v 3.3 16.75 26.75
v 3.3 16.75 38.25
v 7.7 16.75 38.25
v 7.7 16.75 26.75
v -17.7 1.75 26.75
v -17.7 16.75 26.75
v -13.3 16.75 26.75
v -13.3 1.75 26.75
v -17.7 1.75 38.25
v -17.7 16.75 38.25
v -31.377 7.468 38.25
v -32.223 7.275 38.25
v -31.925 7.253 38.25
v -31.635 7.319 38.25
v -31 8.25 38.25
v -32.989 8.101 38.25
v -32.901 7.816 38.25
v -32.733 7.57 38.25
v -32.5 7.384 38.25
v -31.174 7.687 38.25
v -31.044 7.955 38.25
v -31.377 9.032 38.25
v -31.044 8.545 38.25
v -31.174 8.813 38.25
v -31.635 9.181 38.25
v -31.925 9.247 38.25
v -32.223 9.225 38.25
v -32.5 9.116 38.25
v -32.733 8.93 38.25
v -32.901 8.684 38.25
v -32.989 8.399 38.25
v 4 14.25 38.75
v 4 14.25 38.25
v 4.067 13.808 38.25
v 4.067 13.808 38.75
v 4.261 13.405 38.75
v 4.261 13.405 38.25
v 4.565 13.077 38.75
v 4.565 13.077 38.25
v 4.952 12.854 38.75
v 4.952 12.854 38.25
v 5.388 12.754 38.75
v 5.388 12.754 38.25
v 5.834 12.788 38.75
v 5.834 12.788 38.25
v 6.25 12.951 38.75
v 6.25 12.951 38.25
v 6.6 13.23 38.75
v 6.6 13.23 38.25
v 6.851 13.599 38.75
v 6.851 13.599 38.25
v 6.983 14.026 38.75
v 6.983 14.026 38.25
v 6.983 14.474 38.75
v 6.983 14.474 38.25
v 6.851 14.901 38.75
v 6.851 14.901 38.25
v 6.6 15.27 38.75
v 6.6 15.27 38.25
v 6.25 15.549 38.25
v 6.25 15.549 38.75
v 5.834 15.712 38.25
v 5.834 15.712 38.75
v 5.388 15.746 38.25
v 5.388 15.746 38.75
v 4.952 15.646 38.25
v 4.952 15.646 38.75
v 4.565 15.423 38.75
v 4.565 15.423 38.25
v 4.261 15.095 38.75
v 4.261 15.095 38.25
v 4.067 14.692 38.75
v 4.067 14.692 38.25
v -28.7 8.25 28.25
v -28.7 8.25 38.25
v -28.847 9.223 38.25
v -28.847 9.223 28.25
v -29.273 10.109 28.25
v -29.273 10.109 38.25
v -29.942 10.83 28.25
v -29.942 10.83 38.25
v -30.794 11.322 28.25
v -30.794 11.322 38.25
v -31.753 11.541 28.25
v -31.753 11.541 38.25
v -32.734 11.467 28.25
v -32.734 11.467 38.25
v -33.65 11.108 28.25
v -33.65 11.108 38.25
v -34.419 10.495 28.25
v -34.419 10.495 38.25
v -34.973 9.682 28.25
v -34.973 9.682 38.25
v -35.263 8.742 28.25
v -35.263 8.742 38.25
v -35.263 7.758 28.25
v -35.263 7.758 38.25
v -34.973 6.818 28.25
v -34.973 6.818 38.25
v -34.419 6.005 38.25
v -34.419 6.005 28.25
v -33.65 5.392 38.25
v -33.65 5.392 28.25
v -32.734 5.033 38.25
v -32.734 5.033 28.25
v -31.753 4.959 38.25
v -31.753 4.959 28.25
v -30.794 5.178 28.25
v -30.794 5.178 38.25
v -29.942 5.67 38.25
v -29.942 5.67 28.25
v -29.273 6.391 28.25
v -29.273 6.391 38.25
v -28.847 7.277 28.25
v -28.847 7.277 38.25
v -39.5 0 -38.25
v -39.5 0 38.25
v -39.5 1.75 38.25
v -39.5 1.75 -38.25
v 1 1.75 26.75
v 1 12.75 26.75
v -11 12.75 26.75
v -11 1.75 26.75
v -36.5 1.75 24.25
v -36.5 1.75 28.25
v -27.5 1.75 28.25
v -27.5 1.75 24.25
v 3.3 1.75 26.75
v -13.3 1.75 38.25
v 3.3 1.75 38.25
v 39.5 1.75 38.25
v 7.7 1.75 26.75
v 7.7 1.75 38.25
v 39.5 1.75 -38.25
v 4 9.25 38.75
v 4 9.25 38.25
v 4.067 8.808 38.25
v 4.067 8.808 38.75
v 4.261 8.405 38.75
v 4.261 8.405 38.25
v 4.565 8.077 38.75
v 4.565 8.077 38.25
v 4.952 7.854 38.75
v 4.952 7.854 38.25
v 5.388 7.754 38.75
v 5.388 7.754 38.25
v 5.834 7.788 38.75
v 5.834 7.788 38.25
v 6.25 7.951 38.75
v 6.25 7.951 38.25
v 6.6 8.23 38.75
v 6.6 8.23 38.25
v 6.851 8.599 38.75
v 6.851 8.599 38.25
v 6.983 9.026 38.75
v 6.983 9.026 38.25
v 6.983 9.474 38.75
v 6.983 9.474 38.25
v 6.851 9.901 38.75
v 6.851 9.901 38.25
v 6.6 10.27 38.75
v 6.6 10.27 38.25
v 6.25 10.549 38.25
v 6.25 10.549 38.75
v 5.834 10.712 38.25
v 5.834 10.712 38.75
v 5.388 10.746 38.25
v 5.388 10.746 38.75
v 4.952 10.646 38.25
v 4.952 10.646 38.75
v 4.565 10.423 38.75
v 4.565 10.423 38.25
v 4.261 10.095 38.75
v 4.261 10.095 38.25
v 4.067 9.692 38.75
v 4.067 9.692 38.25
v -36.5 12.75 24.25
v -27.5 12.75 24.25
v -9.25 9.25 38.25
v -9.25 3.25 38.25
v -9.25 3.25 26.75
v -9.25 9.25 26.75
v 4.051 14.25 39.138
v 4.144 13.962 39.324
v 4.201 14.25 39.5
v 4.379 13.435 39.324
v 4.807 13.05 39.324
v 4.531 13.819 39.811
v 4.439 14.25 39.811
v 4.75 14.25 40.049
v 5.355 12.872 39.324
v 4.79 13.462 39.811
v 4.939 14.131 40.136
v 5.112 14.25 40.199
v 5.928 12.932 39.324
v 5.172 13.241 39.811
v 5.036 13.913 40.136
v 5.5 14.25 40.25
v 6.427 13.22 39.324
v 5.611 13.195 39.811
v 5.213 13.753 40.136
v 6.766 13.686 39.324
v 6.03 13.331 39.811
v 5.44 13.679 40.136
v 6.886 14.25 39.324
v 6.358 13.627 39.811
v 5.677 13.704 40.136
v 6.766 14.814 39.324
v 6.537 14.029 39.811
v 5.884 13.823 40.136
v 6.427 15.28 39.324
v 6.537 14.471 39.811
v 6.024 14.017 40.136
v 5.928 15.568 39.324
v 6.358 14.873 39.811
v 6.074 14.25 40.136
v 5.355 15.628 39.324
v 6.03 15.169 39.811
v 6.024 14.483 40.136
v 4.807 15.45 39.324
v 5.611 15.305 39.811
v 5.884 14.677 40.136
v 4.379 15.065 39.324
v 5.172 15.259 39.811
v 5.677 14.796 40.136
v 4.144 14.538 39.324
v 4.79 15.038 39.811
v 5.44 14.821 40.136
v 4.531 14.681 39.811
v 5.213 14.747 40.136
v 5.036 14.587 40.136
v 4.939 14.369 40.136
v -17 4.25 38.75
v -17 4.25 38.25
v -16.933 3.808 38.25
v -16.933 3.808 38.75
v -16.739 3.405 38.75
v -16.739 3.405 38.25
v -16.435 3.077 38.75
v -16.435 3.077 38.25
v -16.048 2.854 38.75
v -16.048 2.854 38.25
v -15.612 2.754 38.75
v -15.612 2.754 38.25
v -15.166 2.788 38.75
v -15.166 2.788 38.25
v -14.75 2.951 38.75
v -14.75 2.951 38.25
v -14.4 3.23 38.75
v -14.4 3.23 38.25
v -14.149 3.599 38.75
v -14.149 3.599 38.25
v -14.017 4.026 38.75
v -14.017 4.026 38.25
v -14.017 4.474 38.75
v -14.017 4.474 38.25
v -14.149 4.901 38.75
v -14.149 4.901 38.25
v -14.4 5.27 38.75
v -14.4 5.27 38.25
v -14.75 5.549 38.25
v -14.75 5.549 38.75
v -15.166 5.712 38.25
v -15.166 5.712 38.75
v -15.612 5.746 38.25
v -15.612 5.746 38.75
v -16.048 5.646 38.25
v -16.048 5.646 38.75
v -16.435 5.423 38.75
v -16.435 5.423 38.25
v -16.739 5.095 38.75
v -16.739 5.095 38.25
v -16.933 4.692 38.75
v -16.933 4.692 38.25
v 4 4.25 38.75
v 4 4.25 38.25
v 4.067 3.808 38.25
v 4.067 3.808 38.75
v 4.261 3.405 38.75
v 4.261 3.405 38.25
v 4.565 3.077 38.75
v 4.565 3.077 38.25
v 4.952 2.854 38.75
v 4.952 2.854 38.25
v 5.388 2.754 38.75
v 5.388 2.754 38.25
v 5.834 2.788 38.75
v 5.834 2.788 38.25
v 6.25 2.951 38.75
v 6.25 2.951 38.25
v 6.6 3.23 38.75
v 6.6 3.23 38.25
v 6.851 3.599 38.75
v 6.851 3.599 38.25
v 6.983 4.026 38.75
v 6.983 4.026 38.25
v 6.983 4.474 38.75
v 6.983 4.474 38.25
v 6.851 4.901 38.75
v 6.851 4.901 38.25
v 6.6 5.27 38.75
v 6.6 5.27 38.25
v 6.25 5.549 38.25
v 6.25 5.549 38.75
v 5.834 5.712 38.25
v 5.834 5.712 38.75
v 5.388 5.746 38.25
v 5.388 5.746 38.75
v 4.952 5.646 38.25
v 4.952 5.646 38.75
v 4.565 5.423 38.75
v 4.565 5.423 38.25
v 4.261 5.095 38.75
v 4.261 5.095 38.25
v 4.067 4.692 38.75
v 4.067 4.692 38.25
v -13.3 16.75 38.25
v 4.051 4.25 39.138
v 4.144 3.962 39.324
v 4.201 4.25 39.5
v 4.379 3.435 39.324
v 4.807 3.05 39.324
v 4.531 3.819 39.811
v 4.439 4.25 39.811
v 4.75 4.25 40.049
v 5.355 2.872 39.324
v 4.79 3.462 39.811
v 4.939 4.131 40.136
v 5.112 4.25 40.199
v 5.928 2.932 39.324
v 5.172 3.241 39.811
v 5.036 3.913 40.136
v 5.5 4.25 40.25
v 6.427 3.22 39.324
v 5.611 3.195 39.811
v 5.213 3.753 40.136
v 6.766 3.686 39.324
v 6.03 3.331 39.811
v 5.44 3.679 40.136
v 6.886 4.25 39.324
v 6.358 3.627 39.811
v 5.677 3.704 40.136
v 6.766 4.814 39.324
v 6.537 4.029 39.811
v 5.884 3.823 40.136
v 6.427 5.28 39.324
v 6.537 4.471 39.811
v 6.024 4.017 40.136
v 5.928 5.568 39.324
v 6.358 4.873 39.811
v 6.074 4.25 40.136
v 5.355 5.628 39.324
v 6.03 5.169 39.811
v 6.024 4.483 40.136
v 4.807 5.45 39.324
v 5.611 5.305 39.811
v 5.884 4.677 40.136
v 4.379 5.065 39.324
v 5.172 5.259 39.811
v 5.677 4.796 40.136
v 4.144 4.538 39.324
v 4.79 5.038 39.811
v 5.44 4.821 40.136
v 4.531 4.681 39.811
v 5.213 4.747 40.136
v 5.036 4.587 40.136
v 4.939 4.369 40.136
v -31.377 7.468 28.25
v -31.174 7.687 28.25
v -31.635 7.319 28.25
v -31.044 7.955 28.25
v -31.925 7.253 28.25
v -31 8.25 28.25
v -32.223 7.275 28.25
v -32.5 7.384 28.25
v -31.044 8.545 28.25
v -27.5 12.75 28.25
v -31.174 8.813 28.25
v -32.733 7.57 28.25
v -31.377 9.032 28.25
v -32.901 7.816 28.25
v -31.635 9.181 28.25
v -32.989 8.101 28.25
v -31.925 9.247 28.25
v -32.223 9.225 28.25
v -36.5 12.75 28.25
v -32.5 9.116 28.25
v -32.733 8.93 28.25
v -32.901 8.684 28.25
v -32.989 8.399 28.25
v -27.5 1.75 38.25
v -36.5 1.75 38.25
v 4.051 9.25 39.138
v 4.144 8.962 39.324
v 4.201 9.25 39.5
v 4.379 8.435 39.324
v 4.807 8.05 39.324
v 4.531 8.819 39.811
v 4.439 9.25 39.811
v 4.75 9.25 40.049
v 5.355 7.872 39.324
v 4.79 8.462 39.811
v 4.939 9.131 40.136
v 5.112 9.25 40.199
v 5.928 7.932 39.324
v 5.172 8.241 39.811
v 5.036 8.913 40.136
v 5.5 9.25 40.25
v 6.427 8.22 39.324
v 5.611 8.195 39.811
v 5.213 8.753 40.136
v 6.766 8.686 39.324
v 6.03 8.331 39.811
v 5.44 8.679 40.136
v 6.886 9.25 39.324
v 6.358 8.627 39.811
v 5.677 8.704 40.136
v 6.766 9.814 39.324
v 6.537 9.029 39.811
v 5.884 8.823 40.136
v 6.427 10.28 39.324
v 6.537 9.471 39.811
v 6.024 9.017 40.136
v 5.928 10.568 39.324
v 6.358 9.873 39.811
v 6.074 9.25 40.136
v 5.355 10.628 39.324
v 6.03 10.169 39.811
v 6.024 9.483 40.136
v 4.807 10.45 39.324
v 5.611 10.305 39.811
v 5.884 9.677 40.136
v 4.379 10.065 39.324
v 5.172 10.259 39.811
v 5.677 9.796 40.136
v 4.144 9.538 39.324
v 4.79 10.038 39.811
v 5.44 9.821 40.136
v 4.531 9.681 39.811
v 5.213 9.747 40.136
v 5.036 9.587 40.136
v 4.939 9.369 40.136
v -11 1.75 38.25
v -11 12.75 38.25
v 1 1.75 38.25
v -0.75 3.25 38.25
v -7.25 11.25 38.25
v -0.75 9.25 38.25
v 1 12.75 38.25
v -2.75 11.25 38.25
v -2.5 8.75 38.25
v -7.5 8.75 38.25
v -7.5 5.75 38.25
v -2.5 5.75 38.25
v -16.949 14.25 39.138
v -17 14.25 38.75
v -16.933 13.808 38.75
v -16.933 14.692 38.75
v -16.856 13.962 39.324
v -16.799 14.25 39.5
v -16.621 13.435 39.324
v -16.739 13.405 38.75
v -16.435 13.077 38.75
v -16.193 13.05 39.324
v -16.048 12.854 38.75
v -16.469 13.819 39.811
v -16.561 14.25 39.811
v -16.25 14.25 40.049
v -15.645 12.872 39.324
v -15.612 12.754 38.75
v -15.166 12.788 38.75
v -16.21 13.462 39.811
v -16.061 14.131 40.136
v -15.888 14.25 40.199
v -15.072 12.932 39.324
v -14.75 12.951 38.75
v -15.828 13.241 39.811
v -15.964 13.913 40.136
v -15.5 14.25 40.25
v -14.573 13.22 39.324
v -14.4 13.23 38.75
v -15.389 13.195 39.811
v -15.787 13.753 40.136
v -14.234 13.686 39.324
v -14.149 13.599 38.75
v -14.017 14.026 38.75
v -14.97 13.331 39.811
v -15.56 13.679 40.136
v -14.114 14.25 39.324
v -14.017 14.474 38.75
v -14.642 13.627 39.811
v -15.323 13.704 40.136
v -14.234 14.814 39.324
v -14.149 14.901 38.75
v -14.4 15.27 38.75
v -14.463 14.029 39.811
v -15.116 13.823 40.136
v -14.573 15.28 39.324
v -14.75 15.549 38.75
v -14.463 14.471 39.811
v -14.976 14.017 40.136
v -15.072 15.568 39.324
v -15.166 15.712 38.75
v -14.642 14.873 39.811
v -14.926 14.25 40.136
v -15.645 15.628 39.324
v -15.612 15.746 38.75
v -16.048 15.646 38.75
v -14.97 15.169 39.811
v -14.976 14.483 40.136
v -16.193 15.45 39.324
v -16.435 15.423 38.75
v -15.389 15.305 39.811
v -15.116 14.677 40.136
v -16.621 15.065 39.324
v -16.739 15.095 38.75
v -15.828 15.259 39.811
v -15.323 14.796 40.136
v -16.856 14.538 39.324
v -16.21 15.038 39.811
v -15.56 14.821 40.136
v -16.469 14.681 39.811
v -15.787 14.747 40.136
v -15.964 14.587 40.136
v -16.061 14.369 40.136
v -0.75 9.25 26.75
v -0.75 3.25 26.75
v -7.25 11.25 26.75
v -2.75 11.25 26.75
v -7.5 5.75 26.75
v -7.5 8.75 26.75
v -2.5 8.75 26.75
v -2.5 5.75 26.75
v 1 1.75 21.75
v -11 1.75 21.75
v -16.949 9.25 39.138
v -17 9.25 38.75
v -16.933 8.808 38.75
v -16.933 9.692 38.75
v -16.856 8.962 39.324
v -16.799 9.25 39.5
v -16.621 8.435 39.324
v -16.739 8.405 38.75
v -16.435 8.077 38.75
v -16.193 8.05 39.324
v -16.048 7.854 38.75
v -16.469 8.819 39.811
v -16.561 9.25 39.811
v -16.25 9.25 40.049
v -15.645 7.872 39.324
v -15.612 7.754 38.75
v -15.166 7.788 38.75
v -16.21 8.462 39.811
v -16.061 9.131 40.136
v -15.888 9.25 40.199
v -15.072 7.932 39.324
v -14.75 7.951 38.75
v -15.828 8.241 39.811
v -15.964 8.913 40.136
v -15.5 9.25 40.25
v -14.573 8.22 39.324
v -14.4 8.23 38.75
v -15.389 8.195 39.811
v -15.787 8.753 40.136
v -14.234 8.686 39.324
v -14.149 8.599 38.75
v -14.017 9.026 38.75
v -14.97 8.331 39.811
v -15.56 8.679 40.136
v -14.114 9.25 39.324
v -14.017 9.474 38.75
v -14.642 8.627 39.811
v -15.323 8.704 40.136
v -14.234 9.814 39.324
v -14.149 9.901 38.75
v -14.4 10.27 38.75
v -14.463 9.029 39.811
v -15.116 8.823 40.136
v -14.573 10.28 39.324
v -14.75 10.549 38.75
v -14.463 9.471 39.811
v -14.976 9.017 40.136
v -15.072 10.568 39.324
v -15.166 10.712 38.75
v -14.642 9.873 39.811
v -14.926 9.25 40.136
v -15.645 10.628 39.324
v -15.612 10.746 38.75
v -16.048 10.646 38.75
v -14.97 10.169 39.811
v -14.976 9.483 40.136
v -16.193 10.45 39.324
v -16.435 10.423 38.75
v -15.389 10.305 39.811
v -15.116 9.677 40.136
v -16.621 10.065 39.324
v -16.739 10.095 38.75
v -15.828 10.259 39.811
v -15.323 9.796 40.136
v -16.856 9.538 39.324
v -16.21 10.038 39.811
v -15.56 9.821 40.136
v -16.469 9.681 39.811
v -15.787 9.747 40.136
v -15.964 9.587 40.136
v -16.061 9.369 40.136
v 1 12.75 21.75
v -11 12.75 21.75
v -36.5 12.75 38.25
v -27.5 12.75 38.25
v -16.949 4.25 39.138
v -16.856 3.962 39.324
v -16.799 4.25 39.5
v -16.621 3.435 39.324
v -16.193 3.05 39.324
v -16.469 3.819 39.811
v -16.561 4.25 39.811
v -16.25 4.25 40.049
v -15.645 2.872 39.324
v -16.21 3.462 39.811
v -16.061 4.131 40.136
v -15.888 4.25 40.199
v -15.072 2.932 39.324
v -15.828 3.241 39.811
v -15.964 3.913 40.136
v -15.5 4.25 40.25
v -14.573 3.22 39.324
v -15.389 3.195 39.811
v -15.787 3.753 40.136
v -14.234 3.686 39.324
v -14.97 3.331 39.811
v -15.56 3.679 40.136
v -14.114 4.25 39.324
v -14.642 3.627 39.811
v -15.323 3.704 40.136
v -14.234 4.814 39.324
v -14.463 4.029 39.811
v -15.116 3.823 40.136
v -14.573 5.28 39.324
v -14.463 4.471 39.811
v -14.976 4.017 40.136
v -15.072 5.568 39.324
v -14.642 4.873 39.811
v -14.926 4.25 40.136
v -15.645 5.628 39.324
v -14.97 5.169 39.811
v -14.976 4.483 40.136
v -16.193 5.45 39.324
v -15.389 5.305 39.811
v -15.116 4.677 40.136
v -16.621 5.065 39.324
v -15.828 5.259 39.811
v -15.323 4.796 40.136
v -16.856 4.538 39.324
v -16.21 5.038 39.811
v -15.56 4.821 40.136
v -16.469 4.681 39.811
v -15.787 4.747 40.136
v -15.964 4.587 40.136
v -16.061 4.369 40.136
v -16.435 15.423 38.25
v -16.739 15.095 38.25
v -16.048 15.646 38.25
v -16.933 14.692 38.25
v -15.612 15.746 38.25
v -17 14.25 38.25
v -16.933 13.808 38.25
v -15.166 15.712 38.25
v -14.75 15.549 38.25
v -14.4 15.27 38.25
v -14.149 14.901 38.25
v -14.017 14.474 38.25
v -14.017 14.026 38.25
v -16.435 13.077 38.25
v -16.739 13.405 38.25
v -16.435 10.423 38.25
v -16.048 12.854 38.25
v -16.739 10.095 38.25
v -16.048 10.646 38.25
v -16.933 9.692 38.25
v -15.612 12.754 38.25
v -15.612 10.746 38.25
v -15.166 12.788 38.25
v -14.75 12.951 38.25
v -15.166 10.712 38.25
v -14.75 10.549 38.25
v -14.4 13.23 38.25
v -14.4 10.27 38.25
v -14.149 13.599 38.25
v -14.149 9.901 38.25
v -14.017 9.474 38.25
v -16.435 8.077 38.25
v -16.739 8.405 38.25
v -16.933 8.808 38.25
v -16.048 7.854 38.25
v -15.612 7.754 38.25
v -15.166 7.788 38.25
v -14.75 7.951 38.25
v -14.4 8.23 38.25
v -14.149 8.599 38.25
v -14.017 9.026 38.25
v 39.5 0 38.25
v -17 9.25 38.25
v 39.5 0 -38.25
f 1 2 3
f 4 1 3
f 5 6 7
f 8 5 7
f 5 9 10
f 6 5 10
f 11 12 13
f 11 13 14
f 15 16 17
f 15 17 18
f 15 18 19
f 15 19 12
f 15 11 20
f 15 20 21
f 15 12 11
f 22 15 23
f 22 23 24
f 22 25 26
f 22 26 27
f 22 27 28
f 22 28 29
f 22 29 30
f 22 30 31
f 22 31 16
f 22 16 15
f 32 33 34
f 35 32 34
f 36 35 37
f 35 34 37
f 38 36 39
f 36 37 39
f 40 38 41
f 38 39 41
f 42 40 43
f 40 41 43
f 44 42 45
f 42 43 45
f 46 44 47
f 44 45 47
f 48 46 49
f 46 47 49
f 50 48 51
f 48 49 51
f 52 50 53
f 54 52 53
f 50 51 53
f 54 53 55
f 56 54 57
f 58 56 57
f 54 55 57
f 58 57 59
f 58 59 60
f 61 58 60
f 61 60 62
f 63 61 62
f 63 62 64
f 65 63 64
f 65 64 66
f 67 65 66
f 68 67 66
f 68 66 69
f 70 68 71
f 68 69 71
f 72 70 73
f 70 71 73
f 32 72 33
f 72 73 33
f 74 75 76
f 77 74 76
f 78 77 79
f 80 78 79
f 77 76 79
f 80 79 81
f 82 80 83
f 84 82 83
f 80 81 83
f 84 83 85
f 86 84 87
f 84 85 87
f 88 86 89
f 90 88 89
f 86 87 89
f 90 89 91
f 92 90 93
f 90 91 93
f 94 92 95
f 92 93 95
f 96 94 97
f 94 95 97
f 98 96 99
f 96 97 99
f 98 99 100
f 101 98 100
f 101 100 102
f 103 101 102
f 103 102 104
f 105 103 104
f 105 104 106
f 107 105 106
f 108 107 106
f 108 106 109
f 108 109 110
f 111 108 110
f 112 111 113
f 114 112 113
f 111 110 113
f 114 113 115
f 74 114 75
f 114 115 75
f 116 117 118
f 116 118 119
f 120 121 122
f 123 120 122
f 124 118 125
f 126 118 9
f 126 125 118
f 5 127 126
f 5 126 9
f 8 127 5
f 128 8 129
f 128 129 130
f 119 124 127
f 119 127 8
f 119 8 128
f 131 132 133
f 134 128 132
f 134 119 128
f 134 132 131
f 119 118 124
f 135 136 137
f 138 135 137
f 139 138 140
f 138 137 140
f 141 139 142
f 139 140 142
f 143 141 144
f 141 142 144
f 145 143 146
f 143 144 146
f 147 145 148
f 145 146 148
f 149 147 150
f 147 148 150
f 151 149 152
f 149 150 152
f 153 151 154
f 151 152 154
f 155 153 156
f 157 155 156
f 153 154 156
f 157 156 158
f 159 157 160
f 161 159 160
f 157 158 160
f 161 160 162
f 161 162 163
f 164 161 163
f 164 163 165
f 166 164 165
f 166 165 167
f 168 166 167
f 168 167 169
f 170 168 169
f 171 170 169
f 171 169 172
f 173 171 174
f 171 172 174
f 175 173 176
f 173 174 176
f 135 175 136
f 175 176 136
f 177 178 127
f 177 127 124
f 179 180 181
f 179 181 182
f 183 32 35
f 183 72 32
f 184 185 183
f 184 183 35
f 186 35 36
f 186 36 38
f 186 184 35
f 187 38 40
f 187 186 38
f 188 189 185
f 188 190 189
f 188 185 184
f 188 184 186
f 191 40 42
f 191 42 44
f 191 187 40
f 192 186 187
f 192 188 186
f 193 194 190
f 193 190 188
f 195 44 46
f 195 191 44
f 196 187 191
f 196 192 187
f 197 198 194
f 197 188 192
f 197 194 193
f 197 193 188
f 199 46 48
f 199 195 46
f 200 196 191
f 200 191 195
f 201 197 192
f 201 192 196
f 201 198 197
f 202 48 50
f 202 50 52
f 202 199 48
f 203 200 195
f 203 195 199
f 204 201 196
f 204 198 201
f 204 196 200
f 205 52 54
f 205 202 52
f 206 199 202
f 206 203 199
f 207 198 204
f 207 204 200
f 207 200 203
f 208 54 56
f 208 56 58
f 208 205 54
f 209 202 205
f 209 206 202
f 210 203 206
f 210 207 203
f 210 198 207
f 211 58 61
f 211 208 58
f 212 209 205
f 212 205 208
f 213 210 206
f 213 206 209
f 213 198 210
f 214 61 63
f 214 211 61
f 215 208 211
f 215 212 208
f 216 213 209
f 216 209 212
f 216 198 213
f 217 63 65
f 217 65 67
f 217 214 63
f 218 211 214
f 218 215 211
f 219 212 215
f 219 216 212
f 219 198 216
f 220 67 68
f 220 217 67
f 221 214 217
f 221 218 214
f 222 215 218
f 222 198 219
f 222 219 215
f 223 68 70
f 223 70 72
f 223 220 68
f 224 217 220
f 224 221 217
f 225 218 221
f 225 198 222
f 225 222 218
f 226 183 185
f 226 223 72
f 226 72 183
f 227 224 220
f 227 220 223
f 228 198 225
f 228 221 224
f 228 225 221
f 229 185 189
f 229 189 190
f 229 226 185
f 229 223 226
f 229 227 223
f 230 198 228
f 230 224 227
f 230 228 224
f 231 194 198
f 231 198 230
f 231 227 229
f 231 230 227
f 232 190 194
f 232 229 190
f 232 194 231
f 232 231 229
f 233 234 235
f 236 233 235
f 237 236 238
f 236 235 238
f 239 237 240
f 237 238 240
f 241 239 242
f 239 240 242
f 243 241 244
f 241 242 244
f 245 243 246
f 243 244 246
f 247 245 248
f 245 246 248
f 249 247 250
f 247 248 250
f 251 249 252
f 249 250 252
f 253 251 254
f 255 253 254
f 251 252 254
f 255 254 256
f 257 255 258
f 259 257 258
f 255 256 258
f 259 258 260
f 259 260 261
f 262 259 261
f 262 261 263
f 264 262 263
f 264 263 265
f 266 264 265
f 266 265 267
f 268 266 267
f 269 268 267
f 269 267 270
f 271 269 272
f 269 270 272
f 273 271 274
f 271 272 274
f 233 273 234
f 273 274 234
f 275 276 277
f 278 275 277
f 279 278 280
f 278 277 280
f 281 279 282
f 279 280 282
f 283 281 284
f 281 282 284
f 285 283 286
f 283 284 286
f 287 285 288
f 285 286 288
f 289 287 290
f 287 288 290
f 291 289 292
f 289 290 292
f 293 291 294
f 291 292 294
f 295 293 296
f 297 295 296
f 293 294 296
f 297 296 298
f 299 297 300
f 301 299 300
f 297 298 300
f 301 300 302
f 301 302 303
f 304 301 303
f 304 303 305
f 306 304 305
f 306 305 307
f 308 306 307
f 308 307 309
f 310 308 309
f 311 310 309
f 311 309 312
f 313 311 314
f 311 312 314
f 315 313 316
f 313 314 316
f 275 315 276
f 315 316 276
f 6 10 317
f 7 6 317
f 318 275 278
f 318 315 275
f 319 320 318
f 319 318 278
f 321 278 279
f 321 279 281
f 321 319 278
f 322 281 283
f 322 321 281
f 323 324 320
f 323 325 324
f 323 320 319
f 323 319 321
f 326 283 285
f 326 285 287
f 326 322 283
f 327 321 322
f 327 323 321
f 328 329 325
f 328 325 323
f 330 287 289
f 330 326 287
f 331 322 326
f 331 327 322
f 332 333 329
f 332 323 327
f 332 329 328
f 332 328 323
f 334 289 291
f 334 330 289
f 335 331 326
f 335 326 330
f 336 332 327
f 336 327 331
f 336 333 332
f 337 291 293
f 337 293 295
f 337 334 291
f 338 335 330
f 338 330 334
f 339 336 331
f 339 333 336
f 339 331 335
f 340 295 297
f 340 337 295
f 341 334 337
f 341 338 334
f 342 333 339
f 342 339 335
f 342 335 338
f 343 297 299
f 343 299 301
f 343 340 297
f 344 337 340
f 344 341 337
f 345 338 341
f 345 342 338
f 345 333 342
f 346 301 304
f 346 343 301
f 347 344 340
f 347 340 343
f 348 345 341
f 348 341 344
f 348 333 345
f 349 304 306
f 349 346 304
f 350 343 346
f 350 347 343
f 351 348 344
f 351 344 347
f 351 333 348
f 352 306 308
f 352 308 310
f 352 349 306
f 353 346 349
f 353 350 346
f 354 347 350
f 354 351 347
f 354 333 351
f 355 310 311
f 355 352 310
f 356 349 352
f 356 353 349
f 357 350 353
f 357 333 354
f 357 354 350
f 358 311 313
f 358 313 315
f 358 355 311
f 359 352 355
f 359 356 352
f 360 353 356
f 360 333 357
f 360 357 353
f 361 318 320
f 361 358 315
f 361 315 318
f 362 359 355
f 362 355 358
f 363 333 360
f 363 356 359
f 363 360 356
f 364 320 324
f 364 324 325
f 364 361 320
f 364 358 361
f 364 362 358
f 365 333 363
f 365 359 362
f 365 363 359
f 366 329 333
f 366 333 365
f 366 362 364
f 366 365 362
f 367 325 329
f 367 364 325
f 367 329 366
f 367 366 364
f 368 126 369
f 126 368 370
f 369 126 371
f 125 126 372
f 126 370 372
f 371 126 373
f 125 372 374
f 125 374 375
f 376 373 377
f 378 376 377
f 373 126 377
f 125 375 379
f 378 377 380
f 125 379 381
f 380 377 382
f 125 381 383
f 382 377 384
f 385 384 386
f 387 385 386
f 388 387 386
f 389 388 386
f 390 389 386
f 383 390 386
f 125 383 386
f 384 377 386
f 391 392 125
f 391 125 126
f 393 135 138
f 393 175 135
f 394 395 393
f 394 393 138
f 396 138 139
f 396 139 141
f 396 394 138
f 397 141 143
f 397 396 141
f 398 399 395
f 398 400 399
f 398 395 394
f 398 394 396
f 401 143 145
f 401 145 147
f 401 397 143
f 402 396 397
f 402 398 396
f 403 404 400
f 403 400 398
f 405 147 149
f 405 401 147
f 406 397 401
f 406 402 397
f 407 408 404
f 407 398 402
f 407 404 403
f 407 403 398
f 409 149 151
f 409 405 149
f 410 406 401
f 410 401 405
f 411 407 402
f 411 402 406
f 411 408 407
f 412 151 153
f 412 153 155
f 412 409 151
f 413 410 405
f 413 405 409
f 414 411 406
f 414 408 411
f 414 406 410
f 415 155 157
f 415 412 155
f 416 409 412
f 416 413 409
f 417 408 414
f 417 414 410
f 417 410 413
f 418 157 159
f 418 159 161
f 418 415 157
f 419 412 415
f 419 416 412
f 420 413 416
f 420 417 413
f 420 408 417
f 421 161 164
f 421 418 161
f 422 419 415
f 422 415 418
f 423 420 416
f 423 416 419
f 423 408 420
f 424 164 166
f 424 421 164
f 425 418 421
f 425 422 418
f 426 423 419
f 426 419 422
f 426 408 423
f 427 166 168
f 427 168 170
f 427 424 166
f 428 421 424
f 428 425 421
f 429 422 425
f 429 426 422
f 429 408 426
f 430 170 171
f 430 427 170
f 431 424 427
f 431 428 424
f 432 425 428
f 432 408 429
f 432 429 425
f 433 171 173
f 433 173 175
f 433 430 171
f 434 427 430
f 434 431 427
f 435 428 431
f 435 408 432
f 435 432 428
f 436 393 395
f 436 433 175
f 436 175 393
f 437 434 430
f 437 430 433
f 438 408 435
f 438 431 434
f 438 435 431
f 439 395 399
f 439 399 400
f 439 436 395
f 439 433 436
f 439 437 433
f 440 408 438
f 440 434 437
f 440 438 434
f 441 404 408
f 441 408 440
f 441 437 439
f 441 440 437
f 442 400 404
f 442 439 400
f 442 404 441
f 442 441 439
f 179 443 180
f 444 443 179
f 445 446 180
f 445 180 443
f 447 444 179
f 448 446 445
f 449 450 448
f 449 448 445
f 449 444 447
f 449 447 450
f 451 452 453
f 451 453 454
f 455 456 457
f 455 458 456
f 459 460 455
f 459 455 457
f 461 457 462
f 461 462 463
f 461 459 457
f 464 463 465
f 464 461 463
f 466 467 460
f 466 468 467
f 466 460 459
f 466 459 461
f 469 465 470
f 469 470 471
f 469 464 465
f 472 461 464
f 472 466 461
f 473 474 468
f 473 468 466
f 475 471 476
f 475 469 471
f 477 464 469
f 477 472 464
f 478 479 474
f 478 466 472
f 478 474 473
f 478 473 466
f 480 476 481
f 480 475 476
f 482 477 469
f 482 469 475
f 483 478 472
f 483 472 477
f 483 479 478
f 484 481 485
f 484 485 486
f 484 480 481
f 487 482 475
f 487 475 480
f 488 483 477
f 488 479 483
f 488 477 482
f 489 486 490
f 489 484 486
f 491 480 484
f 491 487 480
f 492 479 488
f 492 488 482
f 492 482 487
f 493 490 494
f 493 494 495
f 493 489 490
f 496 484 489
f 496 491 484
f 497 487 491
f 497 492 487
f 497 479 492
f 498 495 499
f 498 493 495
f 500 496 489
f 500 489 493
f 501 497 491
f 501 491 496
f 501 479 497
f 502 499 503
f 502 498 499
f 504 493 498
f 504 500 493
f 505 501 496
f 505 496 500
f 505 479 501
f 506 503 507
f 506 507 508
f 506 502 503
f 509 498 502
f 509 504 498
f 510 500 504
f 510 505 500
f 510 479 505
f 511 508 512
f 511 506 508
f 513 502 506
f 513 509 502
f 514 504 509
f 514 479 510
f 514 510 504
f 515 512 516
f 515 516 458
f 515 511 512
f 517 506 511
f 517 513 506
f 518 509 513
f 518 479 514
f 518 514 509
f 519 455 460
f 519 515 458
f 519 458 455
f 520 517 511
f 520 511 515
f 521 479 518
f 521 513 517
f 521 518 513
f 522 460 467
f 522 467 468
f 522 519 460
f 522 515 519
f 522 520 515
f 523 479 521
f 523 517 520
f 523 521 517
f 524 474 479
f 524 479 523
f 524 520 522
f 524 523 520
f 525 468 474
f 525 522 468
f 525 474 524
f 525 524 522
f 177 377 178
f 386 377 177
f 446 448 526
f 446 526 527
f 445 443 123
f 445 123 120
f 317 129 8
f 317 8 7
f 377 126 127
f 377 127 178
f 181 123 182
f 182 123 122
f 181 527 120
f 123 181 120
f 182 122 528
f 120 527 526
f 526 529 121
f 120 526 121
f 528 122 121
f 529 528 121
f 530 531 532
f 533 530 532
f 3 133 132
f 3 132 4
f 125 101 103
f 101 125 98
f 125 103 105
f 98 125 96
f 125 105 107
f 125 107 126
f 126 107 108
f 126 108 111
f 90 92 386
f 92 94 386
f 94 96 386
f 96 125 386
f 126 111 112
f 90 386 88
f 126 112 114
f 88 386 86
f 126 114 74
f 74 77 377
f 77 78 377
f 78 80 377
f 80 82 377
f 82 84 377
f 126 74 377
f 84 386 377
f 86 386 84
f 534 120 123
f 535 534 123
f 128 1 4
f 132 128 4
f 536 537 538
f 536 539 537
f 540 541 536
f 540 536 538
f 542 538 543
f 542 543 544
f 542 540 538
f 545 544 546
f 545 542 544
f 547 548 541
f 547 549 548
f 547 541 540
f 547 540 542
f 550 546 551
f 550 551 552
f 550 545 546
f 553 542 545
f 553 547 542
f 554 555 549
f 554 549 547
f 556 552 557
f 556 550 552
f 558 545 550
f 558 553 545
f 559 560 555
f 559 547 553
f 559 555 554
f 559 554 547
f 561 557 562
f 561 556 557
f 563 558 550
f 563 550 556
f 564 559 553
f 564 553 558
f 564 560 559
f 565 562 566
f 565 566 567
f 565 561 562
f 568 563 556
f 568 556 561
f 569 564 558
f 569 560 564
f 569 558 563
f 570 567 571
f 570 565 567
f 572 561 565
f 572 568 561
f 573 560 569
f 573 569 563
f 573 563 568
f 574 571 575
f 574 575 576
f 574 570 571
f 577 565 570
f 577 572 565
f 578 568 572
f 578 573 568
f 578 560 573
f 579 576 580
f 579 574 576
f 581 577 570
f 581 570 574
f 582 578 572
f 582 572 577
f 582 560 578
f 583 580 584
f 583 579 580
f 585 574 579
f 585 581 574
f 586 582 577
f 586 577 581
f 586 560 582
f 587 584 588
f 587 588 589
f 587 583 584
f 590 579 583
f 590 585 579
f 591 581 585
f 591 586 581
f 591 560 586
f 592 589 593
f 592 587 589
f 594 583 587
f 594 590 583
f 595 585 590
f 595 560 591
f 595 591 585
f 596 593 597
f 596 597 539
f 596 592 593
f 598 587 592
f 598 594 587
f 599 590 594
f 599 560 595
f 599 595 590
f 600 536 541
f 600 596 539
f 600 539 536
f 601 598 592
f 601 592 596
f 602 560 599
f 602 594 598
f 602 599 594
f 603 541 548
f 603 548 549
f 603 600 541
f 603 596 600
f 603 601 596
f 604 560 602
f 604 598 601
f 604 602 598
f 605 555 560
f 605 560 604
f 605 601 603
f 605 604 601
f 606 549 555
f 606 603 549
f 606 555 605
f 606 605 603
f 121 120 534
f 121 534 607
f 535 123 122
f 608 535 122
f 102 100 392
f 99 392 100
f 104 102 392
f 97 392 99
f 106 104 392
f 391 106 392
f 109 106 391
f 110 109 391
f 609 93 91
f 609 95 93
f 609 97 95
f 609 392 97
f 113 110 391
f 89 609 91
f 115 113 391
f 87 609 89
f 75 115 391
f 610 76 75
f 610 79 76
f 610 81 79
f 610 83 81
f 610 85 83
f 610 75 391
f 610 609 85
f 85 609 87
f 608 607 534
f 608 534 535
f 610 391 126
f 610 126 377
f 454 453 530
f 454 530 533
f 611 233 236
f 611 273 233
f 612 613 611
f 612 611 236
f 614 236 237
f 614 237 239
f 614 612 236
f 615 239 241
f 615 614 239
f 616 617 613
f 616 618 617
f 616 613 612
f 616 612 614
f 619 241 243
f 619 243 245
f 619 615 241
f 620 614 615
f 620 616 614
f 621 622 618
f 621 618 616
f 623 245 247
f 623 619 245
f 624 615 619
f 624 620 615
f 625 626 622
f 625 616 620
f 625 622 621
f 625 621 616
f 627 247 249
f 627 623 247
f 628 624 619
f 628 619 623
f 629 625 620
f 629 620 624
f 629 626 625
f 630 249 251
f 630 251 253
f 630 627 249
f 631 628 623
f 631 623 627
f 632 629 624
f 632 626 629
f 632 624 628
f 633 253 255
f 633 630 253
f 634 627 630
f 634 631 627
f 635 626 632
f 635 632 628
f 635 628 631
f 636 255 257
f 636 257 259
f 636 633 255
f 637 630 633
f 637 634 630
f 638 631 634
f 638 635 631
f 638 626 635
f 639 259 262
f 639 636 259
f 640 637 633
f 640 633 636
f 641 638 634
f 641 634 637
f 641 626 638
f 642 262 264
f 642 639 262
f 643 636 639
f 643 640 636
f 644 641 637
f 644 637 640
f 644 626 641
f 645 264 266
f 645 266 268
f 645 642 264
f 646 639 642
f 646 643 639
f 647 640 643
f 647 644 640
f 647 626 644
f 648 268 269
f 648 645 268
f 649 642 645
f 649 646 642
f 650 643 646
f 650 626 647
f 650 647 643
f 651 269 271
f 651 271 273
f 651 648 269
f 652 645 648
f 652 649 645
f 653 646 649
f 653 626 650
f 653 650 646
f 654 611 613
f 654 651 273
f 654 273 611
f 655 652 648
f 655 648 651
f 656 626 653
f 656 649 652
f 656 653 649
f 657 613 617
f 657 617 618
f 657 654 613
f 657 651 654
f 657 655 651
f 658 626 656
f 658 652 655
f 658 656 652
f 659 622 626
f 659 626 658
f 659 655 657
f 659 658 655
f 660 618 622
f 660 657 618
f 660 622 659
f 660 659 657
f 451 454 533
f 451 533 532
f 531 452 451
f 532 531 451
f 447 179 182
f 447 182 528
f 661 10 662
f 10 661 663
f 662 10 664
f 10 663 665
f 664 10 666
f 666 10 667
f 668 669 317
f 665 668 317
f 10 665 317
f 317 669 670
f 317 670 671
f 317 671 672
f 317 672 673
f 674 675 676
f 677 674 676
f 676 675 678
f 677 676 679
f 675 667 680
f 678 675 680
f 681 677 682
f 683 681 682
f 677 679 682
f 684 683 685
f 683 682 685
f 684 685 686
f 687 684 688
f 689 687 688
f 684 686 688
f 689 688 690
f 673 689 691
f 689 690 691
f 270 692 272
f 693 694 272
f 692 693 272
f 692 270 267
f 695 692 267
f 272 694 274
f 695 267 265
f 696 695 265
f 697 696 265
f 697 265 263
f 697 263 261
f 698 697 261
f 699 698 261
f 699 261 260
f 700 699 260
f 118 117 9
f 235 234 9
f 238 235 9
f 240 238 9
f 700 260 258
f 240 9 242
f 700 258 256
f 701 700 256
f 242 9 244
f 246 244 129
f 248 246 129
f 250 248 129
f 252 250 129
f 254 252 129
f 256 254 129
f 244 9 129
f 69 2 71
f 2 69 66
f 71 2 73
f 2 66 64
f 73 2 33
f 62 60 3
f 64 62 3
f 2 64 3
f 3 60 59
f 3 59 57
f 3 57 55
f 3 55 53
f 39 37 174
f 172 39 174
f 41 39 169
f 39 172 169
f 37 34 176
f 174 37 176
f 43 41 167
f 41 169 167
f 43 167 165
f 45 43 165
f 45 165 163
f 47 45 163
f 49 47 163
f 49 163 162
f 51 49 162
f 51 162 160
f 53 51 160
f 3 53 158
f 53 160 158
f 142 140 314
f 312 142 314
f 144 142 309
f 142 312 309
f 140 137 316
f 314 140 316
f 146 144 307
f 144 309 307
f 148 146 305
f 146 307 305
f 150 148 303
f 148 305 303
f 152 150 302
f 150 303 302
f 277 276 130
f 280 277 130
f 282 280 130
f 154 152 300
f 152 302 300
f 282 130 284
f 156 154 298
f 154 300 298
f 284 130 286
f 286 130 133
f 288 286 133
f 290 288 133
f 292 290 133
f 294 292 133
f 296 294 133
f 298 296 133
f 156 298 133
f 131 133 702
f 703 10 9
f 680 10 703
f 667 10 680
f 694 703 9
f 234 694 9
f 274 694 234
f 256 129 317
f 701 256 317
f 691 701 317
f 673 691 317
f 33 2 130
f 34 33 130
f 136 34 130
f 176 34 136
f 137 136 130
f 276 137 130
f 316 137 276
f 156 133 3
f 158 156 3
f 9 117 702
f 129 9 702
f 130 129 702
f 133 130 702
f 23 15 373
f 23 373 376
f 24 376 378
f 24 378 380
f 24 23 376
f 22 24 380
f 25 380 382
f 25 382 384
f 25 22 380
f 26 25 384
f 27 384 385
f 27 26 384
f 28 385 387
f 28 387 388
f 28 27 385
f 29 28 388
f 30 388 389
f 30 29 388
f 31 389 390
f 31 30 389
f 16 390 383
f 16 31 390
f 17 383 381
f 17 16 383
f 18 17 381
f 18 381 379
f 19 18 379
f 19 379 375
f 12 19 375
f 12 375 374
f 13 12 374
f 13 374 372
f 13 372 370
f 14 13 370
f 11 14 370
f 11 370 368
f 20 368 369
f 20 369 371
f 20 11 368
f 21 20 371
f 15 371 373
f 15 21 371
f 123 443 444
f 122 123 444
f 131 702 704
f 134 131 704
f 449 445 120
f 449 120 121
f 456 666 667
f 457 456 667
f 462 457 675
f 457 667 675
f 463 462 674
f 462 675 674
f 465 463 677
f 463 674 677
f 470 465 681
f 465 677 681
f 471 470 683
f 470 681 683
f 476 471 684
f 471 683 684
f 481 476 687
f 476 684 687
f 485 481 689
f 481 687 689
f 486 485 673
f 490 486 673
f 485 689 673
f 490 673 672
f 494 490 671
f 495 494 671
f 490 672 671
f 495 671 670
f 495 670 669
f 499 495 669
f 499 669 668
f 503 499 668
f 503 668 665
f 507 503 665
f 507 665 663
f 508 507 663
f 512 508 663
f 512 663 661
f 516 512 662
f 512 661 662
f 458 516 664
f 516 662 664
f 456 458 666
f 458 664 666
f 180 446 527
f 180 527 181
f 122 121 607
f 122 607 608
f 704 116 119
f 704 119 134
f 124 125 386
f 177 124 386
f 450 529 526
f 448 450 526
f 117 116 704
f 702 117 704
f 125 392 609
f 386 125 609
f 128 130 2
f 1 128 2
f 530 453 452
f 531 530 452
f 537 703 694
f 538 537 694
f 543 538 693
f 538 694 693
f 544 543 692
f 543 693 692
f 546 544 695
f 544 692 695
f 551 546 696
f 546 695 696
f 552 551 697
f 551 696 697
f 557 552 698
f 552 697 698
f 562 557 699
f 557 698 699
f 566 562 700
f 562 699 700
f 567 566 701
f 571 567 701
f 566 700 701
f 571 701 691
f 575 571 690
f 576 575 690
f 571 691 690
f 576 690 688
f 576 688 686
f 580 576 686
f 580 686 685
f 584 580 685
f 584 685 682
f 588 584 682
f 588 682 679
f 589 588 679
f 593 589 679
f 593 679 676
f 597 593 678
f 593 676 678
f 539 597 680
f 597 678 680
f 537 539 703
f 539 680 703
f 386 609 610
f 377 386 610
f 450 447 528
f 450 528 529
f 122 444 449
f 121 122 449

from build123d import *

# Parameters (mm, degrees)
SKETCH1_W             = 79
SKETCH1_H             = 76.5
BOSS_EXTRUDE1_DEPTH   = 1.75
SKETCH2_W             = 9
SKETCH2_H             = 11
SKETCH2_R             = 3.3
BOSS_EXTRUDE2_DEPTH   = 10
SKETCH2_R_2           = 1
BOSS_EXTRUDE2_2_DEPTH = 10
SKETCH3_W             = 9
SKETCH3_H             = 11
BOSS_EXTRUDE3_DEPTH   = 4
SKETCH4_W             = 12
SKETCH4_H             = 11
BOSS_EXTRUDE4_DEPTH   = 11.5
SKETCH4_W_2           = 4.4
SKETCH4_H_2           = 15
BOSS_EXTRUDE4_2_DEPTH = 11.5
BOSS_EXTRUDE4_3_DEPTH = 11.5
SKETCH4_W_3           = 5
SKETCH4_H_3           = 3
BOSS_EXTRUDE4_4_DEPTH = 11.5
SKETCH5_W             = 12
SKETCH5_H             = 11
BOSS_EXTRUDE5_DEPTH   = 5
SKETCH6_R             = 1.5
BOSS_EXTRUDE6_DEPTH   = 2
FILLET1_R             = 1.5


with BuildPart() as part:
    # Sketch1 → Boss-Extrude1 (new body)
    with BuildSketch(Plane(origin=(0, 0, 0), x_dir=(1, 0, 0), z_dir=(0, 1, 0))):
        Rectangle(SKETCH1_W, SKETCH1_H)
    extrude(amount=BOSS_EXTRUDE1_DEPTH)



with BuildPart() as body_2:
    # Sketch2 → Boss-Extrude2 (new body)
    with BuildSketch(Plane.XY.offset(38.25)):
        with Locations((-32, 7.25)):
            Rectangle(SKETCH2_W, SKETCH2_H)
        with Locations((-32, 8.25)):
            Circle(SKETCH2_R, mode=Mode.SUBTRACT)
    extrude(amount=-BOSS_EXTRUDE2_DEPTH)


with BuildPart() as body_3:
    # Sketch2 → Boss-Extrude2 2 (new body)
    with BuildSketch(Plane.XY.offset(38.25)):
        with Locations((-32, 8.25)):
            Circle(SKETCH2_R_2)
    extrude(amount=-BOSS_EXTRUDE2_2_DEPTH)


with BuildPart() as part_1:
    add(part.part)

    add(body_3.part)  # Boss-Extrude3 merges body 3
    # Sketch3 → Boss-Extrude3 (add)
    with BuildSketch(Plane(origin=(0, 0, 28.25), x_dir=(-1, 0, 0), z_dir=(0, 0, -1))):
        with Locations((32, 7.25)):
            Rectangle(SKETCH3_W, SKETCH3_H)
    extrude(amount=BOSS_EXTRUDE3_DEPTH)



with BuildPart() as body_3_2:
    # Sketch4 → Boss-Extrude4 (new body)
    with BuildSketch(Plane.XY.offset(38.25)):
        with Locations((-5, 7.25)):
            Rectangle(SKETCH4_W, SKETCH4_H)
        Polygon((-9.25, 3.25), (-9.25, 9.25), (-7.25, 11.25), (-2.75, 11.25), (-0.75, 9.25), (-0.75, 3.25), align=None, mode=Mode.SUBTRACT)
    extrude(amount=-BOSS_EXTRUDE4_DEPTH)


with BuildPart() as body_4:
    # Sketch4 → Boss-Extrude4 2 (new body)
    with BuildSketch(Plane.XY.offset(38.25)):
        with Locations((-15.5, 9.25)):
            Rectangle(SKETCH4_W_2, SKETCH4_H_2)
    extrude(amount=-BOSS_EXTRUDE4_2_DEPTH)


with BuildPart() as body_5:
    # Sketch4 → Boss-Extrude4 3 (new body)
    with BuildSketch(Plane.XY.offset(38.25)):
        with Locations((5.5, 9.25)):
            Rectangle(SKETCH4_W_2, SKETCH4_H_2)
    extrude(amount=-BOSS_EXTRUDE4_3_DEPTH)


with BuildPart() as body_6:
    # Sketch4 → Boss-Extrude4 4 (new body)
    with BuildSketch(Plane.XY.offset(38.25)):
        with Locations((-5, 7.25)):
            Rectangle(SKETCH4_W_3, SKETCH4_H_3)
    extrude(amount=-BOSS_EXTRUDE4_4_DEPTH)


with BuildPart() as body_7:
    # Sketch5 → Boss-Extrude5 (new body)
    with BuildSketch(Plane(origin=(0, 0, 26.75), x_dir=(-1, 0, 0), z_dir=(0, 0, -1))):
        with Locations((5, 7.25)):
            Rectangle(SKETCH5_W, SKETCH5_H)
    extrude(amount=BOSS_EXTRUDE5_DEPTH)


with BuildPart() as part_2:
    add(part_1.part)

    add(body_5.part)  # Boss-Extrude6 merges body 5

    add(body_4.part)  # Boss-Extrude6 merges body 4
    # Sketch6 → Boss-Extrude6 (add)
    with BuildSketch(Plane.XY.offset(38.25)):
        with Locations(Location((-15.5, 9.25, 0), (0, 0, 180))):
            Circle(SKETCH6_R)
        with Locations(Location((5.5, 9.25, 0), (0, 0, 180))):
            Circle(SKETCH6_R)
        with Locations(Location((-15.5, 4.25, 0), (0, 0, 180))):
            Circle(SKETCH6_R)
        with Locations(Location((5.5, 4.25, 0), (0, 0, 180))):
            Circle(SKETCH6_R)
        with Locations(Location((-15.5, 14.25, 0), (0, 0, 180))):
            Circle(SKETCH6_R)
        with Locations(Location((5.5, 14.25, 0), (0, 0, 180))):
            Circle(SKETCH6_R)
    extrude(amount=BOSS_EXTRUDE6_DEPTH)

    # Fillet1
    fillet1_edges = [part_2.edges().sort_by_distance(p)[0] for p in [
        (-14, 9.25, 40.25),
        (7, 9.25, 40.25),
        (-14, 4.25, 40.25),
        (7, 4.25, 40.25),
        (-14, 14.25, 40.25),
        (7, 14.25, 40.25),
    ]]
    fillet(fillet1_edges, radius=FILLET1_R)


solid = Compound([body_2.part, body_3_2.part, body_6.part, body_7.part, part_2.part])
